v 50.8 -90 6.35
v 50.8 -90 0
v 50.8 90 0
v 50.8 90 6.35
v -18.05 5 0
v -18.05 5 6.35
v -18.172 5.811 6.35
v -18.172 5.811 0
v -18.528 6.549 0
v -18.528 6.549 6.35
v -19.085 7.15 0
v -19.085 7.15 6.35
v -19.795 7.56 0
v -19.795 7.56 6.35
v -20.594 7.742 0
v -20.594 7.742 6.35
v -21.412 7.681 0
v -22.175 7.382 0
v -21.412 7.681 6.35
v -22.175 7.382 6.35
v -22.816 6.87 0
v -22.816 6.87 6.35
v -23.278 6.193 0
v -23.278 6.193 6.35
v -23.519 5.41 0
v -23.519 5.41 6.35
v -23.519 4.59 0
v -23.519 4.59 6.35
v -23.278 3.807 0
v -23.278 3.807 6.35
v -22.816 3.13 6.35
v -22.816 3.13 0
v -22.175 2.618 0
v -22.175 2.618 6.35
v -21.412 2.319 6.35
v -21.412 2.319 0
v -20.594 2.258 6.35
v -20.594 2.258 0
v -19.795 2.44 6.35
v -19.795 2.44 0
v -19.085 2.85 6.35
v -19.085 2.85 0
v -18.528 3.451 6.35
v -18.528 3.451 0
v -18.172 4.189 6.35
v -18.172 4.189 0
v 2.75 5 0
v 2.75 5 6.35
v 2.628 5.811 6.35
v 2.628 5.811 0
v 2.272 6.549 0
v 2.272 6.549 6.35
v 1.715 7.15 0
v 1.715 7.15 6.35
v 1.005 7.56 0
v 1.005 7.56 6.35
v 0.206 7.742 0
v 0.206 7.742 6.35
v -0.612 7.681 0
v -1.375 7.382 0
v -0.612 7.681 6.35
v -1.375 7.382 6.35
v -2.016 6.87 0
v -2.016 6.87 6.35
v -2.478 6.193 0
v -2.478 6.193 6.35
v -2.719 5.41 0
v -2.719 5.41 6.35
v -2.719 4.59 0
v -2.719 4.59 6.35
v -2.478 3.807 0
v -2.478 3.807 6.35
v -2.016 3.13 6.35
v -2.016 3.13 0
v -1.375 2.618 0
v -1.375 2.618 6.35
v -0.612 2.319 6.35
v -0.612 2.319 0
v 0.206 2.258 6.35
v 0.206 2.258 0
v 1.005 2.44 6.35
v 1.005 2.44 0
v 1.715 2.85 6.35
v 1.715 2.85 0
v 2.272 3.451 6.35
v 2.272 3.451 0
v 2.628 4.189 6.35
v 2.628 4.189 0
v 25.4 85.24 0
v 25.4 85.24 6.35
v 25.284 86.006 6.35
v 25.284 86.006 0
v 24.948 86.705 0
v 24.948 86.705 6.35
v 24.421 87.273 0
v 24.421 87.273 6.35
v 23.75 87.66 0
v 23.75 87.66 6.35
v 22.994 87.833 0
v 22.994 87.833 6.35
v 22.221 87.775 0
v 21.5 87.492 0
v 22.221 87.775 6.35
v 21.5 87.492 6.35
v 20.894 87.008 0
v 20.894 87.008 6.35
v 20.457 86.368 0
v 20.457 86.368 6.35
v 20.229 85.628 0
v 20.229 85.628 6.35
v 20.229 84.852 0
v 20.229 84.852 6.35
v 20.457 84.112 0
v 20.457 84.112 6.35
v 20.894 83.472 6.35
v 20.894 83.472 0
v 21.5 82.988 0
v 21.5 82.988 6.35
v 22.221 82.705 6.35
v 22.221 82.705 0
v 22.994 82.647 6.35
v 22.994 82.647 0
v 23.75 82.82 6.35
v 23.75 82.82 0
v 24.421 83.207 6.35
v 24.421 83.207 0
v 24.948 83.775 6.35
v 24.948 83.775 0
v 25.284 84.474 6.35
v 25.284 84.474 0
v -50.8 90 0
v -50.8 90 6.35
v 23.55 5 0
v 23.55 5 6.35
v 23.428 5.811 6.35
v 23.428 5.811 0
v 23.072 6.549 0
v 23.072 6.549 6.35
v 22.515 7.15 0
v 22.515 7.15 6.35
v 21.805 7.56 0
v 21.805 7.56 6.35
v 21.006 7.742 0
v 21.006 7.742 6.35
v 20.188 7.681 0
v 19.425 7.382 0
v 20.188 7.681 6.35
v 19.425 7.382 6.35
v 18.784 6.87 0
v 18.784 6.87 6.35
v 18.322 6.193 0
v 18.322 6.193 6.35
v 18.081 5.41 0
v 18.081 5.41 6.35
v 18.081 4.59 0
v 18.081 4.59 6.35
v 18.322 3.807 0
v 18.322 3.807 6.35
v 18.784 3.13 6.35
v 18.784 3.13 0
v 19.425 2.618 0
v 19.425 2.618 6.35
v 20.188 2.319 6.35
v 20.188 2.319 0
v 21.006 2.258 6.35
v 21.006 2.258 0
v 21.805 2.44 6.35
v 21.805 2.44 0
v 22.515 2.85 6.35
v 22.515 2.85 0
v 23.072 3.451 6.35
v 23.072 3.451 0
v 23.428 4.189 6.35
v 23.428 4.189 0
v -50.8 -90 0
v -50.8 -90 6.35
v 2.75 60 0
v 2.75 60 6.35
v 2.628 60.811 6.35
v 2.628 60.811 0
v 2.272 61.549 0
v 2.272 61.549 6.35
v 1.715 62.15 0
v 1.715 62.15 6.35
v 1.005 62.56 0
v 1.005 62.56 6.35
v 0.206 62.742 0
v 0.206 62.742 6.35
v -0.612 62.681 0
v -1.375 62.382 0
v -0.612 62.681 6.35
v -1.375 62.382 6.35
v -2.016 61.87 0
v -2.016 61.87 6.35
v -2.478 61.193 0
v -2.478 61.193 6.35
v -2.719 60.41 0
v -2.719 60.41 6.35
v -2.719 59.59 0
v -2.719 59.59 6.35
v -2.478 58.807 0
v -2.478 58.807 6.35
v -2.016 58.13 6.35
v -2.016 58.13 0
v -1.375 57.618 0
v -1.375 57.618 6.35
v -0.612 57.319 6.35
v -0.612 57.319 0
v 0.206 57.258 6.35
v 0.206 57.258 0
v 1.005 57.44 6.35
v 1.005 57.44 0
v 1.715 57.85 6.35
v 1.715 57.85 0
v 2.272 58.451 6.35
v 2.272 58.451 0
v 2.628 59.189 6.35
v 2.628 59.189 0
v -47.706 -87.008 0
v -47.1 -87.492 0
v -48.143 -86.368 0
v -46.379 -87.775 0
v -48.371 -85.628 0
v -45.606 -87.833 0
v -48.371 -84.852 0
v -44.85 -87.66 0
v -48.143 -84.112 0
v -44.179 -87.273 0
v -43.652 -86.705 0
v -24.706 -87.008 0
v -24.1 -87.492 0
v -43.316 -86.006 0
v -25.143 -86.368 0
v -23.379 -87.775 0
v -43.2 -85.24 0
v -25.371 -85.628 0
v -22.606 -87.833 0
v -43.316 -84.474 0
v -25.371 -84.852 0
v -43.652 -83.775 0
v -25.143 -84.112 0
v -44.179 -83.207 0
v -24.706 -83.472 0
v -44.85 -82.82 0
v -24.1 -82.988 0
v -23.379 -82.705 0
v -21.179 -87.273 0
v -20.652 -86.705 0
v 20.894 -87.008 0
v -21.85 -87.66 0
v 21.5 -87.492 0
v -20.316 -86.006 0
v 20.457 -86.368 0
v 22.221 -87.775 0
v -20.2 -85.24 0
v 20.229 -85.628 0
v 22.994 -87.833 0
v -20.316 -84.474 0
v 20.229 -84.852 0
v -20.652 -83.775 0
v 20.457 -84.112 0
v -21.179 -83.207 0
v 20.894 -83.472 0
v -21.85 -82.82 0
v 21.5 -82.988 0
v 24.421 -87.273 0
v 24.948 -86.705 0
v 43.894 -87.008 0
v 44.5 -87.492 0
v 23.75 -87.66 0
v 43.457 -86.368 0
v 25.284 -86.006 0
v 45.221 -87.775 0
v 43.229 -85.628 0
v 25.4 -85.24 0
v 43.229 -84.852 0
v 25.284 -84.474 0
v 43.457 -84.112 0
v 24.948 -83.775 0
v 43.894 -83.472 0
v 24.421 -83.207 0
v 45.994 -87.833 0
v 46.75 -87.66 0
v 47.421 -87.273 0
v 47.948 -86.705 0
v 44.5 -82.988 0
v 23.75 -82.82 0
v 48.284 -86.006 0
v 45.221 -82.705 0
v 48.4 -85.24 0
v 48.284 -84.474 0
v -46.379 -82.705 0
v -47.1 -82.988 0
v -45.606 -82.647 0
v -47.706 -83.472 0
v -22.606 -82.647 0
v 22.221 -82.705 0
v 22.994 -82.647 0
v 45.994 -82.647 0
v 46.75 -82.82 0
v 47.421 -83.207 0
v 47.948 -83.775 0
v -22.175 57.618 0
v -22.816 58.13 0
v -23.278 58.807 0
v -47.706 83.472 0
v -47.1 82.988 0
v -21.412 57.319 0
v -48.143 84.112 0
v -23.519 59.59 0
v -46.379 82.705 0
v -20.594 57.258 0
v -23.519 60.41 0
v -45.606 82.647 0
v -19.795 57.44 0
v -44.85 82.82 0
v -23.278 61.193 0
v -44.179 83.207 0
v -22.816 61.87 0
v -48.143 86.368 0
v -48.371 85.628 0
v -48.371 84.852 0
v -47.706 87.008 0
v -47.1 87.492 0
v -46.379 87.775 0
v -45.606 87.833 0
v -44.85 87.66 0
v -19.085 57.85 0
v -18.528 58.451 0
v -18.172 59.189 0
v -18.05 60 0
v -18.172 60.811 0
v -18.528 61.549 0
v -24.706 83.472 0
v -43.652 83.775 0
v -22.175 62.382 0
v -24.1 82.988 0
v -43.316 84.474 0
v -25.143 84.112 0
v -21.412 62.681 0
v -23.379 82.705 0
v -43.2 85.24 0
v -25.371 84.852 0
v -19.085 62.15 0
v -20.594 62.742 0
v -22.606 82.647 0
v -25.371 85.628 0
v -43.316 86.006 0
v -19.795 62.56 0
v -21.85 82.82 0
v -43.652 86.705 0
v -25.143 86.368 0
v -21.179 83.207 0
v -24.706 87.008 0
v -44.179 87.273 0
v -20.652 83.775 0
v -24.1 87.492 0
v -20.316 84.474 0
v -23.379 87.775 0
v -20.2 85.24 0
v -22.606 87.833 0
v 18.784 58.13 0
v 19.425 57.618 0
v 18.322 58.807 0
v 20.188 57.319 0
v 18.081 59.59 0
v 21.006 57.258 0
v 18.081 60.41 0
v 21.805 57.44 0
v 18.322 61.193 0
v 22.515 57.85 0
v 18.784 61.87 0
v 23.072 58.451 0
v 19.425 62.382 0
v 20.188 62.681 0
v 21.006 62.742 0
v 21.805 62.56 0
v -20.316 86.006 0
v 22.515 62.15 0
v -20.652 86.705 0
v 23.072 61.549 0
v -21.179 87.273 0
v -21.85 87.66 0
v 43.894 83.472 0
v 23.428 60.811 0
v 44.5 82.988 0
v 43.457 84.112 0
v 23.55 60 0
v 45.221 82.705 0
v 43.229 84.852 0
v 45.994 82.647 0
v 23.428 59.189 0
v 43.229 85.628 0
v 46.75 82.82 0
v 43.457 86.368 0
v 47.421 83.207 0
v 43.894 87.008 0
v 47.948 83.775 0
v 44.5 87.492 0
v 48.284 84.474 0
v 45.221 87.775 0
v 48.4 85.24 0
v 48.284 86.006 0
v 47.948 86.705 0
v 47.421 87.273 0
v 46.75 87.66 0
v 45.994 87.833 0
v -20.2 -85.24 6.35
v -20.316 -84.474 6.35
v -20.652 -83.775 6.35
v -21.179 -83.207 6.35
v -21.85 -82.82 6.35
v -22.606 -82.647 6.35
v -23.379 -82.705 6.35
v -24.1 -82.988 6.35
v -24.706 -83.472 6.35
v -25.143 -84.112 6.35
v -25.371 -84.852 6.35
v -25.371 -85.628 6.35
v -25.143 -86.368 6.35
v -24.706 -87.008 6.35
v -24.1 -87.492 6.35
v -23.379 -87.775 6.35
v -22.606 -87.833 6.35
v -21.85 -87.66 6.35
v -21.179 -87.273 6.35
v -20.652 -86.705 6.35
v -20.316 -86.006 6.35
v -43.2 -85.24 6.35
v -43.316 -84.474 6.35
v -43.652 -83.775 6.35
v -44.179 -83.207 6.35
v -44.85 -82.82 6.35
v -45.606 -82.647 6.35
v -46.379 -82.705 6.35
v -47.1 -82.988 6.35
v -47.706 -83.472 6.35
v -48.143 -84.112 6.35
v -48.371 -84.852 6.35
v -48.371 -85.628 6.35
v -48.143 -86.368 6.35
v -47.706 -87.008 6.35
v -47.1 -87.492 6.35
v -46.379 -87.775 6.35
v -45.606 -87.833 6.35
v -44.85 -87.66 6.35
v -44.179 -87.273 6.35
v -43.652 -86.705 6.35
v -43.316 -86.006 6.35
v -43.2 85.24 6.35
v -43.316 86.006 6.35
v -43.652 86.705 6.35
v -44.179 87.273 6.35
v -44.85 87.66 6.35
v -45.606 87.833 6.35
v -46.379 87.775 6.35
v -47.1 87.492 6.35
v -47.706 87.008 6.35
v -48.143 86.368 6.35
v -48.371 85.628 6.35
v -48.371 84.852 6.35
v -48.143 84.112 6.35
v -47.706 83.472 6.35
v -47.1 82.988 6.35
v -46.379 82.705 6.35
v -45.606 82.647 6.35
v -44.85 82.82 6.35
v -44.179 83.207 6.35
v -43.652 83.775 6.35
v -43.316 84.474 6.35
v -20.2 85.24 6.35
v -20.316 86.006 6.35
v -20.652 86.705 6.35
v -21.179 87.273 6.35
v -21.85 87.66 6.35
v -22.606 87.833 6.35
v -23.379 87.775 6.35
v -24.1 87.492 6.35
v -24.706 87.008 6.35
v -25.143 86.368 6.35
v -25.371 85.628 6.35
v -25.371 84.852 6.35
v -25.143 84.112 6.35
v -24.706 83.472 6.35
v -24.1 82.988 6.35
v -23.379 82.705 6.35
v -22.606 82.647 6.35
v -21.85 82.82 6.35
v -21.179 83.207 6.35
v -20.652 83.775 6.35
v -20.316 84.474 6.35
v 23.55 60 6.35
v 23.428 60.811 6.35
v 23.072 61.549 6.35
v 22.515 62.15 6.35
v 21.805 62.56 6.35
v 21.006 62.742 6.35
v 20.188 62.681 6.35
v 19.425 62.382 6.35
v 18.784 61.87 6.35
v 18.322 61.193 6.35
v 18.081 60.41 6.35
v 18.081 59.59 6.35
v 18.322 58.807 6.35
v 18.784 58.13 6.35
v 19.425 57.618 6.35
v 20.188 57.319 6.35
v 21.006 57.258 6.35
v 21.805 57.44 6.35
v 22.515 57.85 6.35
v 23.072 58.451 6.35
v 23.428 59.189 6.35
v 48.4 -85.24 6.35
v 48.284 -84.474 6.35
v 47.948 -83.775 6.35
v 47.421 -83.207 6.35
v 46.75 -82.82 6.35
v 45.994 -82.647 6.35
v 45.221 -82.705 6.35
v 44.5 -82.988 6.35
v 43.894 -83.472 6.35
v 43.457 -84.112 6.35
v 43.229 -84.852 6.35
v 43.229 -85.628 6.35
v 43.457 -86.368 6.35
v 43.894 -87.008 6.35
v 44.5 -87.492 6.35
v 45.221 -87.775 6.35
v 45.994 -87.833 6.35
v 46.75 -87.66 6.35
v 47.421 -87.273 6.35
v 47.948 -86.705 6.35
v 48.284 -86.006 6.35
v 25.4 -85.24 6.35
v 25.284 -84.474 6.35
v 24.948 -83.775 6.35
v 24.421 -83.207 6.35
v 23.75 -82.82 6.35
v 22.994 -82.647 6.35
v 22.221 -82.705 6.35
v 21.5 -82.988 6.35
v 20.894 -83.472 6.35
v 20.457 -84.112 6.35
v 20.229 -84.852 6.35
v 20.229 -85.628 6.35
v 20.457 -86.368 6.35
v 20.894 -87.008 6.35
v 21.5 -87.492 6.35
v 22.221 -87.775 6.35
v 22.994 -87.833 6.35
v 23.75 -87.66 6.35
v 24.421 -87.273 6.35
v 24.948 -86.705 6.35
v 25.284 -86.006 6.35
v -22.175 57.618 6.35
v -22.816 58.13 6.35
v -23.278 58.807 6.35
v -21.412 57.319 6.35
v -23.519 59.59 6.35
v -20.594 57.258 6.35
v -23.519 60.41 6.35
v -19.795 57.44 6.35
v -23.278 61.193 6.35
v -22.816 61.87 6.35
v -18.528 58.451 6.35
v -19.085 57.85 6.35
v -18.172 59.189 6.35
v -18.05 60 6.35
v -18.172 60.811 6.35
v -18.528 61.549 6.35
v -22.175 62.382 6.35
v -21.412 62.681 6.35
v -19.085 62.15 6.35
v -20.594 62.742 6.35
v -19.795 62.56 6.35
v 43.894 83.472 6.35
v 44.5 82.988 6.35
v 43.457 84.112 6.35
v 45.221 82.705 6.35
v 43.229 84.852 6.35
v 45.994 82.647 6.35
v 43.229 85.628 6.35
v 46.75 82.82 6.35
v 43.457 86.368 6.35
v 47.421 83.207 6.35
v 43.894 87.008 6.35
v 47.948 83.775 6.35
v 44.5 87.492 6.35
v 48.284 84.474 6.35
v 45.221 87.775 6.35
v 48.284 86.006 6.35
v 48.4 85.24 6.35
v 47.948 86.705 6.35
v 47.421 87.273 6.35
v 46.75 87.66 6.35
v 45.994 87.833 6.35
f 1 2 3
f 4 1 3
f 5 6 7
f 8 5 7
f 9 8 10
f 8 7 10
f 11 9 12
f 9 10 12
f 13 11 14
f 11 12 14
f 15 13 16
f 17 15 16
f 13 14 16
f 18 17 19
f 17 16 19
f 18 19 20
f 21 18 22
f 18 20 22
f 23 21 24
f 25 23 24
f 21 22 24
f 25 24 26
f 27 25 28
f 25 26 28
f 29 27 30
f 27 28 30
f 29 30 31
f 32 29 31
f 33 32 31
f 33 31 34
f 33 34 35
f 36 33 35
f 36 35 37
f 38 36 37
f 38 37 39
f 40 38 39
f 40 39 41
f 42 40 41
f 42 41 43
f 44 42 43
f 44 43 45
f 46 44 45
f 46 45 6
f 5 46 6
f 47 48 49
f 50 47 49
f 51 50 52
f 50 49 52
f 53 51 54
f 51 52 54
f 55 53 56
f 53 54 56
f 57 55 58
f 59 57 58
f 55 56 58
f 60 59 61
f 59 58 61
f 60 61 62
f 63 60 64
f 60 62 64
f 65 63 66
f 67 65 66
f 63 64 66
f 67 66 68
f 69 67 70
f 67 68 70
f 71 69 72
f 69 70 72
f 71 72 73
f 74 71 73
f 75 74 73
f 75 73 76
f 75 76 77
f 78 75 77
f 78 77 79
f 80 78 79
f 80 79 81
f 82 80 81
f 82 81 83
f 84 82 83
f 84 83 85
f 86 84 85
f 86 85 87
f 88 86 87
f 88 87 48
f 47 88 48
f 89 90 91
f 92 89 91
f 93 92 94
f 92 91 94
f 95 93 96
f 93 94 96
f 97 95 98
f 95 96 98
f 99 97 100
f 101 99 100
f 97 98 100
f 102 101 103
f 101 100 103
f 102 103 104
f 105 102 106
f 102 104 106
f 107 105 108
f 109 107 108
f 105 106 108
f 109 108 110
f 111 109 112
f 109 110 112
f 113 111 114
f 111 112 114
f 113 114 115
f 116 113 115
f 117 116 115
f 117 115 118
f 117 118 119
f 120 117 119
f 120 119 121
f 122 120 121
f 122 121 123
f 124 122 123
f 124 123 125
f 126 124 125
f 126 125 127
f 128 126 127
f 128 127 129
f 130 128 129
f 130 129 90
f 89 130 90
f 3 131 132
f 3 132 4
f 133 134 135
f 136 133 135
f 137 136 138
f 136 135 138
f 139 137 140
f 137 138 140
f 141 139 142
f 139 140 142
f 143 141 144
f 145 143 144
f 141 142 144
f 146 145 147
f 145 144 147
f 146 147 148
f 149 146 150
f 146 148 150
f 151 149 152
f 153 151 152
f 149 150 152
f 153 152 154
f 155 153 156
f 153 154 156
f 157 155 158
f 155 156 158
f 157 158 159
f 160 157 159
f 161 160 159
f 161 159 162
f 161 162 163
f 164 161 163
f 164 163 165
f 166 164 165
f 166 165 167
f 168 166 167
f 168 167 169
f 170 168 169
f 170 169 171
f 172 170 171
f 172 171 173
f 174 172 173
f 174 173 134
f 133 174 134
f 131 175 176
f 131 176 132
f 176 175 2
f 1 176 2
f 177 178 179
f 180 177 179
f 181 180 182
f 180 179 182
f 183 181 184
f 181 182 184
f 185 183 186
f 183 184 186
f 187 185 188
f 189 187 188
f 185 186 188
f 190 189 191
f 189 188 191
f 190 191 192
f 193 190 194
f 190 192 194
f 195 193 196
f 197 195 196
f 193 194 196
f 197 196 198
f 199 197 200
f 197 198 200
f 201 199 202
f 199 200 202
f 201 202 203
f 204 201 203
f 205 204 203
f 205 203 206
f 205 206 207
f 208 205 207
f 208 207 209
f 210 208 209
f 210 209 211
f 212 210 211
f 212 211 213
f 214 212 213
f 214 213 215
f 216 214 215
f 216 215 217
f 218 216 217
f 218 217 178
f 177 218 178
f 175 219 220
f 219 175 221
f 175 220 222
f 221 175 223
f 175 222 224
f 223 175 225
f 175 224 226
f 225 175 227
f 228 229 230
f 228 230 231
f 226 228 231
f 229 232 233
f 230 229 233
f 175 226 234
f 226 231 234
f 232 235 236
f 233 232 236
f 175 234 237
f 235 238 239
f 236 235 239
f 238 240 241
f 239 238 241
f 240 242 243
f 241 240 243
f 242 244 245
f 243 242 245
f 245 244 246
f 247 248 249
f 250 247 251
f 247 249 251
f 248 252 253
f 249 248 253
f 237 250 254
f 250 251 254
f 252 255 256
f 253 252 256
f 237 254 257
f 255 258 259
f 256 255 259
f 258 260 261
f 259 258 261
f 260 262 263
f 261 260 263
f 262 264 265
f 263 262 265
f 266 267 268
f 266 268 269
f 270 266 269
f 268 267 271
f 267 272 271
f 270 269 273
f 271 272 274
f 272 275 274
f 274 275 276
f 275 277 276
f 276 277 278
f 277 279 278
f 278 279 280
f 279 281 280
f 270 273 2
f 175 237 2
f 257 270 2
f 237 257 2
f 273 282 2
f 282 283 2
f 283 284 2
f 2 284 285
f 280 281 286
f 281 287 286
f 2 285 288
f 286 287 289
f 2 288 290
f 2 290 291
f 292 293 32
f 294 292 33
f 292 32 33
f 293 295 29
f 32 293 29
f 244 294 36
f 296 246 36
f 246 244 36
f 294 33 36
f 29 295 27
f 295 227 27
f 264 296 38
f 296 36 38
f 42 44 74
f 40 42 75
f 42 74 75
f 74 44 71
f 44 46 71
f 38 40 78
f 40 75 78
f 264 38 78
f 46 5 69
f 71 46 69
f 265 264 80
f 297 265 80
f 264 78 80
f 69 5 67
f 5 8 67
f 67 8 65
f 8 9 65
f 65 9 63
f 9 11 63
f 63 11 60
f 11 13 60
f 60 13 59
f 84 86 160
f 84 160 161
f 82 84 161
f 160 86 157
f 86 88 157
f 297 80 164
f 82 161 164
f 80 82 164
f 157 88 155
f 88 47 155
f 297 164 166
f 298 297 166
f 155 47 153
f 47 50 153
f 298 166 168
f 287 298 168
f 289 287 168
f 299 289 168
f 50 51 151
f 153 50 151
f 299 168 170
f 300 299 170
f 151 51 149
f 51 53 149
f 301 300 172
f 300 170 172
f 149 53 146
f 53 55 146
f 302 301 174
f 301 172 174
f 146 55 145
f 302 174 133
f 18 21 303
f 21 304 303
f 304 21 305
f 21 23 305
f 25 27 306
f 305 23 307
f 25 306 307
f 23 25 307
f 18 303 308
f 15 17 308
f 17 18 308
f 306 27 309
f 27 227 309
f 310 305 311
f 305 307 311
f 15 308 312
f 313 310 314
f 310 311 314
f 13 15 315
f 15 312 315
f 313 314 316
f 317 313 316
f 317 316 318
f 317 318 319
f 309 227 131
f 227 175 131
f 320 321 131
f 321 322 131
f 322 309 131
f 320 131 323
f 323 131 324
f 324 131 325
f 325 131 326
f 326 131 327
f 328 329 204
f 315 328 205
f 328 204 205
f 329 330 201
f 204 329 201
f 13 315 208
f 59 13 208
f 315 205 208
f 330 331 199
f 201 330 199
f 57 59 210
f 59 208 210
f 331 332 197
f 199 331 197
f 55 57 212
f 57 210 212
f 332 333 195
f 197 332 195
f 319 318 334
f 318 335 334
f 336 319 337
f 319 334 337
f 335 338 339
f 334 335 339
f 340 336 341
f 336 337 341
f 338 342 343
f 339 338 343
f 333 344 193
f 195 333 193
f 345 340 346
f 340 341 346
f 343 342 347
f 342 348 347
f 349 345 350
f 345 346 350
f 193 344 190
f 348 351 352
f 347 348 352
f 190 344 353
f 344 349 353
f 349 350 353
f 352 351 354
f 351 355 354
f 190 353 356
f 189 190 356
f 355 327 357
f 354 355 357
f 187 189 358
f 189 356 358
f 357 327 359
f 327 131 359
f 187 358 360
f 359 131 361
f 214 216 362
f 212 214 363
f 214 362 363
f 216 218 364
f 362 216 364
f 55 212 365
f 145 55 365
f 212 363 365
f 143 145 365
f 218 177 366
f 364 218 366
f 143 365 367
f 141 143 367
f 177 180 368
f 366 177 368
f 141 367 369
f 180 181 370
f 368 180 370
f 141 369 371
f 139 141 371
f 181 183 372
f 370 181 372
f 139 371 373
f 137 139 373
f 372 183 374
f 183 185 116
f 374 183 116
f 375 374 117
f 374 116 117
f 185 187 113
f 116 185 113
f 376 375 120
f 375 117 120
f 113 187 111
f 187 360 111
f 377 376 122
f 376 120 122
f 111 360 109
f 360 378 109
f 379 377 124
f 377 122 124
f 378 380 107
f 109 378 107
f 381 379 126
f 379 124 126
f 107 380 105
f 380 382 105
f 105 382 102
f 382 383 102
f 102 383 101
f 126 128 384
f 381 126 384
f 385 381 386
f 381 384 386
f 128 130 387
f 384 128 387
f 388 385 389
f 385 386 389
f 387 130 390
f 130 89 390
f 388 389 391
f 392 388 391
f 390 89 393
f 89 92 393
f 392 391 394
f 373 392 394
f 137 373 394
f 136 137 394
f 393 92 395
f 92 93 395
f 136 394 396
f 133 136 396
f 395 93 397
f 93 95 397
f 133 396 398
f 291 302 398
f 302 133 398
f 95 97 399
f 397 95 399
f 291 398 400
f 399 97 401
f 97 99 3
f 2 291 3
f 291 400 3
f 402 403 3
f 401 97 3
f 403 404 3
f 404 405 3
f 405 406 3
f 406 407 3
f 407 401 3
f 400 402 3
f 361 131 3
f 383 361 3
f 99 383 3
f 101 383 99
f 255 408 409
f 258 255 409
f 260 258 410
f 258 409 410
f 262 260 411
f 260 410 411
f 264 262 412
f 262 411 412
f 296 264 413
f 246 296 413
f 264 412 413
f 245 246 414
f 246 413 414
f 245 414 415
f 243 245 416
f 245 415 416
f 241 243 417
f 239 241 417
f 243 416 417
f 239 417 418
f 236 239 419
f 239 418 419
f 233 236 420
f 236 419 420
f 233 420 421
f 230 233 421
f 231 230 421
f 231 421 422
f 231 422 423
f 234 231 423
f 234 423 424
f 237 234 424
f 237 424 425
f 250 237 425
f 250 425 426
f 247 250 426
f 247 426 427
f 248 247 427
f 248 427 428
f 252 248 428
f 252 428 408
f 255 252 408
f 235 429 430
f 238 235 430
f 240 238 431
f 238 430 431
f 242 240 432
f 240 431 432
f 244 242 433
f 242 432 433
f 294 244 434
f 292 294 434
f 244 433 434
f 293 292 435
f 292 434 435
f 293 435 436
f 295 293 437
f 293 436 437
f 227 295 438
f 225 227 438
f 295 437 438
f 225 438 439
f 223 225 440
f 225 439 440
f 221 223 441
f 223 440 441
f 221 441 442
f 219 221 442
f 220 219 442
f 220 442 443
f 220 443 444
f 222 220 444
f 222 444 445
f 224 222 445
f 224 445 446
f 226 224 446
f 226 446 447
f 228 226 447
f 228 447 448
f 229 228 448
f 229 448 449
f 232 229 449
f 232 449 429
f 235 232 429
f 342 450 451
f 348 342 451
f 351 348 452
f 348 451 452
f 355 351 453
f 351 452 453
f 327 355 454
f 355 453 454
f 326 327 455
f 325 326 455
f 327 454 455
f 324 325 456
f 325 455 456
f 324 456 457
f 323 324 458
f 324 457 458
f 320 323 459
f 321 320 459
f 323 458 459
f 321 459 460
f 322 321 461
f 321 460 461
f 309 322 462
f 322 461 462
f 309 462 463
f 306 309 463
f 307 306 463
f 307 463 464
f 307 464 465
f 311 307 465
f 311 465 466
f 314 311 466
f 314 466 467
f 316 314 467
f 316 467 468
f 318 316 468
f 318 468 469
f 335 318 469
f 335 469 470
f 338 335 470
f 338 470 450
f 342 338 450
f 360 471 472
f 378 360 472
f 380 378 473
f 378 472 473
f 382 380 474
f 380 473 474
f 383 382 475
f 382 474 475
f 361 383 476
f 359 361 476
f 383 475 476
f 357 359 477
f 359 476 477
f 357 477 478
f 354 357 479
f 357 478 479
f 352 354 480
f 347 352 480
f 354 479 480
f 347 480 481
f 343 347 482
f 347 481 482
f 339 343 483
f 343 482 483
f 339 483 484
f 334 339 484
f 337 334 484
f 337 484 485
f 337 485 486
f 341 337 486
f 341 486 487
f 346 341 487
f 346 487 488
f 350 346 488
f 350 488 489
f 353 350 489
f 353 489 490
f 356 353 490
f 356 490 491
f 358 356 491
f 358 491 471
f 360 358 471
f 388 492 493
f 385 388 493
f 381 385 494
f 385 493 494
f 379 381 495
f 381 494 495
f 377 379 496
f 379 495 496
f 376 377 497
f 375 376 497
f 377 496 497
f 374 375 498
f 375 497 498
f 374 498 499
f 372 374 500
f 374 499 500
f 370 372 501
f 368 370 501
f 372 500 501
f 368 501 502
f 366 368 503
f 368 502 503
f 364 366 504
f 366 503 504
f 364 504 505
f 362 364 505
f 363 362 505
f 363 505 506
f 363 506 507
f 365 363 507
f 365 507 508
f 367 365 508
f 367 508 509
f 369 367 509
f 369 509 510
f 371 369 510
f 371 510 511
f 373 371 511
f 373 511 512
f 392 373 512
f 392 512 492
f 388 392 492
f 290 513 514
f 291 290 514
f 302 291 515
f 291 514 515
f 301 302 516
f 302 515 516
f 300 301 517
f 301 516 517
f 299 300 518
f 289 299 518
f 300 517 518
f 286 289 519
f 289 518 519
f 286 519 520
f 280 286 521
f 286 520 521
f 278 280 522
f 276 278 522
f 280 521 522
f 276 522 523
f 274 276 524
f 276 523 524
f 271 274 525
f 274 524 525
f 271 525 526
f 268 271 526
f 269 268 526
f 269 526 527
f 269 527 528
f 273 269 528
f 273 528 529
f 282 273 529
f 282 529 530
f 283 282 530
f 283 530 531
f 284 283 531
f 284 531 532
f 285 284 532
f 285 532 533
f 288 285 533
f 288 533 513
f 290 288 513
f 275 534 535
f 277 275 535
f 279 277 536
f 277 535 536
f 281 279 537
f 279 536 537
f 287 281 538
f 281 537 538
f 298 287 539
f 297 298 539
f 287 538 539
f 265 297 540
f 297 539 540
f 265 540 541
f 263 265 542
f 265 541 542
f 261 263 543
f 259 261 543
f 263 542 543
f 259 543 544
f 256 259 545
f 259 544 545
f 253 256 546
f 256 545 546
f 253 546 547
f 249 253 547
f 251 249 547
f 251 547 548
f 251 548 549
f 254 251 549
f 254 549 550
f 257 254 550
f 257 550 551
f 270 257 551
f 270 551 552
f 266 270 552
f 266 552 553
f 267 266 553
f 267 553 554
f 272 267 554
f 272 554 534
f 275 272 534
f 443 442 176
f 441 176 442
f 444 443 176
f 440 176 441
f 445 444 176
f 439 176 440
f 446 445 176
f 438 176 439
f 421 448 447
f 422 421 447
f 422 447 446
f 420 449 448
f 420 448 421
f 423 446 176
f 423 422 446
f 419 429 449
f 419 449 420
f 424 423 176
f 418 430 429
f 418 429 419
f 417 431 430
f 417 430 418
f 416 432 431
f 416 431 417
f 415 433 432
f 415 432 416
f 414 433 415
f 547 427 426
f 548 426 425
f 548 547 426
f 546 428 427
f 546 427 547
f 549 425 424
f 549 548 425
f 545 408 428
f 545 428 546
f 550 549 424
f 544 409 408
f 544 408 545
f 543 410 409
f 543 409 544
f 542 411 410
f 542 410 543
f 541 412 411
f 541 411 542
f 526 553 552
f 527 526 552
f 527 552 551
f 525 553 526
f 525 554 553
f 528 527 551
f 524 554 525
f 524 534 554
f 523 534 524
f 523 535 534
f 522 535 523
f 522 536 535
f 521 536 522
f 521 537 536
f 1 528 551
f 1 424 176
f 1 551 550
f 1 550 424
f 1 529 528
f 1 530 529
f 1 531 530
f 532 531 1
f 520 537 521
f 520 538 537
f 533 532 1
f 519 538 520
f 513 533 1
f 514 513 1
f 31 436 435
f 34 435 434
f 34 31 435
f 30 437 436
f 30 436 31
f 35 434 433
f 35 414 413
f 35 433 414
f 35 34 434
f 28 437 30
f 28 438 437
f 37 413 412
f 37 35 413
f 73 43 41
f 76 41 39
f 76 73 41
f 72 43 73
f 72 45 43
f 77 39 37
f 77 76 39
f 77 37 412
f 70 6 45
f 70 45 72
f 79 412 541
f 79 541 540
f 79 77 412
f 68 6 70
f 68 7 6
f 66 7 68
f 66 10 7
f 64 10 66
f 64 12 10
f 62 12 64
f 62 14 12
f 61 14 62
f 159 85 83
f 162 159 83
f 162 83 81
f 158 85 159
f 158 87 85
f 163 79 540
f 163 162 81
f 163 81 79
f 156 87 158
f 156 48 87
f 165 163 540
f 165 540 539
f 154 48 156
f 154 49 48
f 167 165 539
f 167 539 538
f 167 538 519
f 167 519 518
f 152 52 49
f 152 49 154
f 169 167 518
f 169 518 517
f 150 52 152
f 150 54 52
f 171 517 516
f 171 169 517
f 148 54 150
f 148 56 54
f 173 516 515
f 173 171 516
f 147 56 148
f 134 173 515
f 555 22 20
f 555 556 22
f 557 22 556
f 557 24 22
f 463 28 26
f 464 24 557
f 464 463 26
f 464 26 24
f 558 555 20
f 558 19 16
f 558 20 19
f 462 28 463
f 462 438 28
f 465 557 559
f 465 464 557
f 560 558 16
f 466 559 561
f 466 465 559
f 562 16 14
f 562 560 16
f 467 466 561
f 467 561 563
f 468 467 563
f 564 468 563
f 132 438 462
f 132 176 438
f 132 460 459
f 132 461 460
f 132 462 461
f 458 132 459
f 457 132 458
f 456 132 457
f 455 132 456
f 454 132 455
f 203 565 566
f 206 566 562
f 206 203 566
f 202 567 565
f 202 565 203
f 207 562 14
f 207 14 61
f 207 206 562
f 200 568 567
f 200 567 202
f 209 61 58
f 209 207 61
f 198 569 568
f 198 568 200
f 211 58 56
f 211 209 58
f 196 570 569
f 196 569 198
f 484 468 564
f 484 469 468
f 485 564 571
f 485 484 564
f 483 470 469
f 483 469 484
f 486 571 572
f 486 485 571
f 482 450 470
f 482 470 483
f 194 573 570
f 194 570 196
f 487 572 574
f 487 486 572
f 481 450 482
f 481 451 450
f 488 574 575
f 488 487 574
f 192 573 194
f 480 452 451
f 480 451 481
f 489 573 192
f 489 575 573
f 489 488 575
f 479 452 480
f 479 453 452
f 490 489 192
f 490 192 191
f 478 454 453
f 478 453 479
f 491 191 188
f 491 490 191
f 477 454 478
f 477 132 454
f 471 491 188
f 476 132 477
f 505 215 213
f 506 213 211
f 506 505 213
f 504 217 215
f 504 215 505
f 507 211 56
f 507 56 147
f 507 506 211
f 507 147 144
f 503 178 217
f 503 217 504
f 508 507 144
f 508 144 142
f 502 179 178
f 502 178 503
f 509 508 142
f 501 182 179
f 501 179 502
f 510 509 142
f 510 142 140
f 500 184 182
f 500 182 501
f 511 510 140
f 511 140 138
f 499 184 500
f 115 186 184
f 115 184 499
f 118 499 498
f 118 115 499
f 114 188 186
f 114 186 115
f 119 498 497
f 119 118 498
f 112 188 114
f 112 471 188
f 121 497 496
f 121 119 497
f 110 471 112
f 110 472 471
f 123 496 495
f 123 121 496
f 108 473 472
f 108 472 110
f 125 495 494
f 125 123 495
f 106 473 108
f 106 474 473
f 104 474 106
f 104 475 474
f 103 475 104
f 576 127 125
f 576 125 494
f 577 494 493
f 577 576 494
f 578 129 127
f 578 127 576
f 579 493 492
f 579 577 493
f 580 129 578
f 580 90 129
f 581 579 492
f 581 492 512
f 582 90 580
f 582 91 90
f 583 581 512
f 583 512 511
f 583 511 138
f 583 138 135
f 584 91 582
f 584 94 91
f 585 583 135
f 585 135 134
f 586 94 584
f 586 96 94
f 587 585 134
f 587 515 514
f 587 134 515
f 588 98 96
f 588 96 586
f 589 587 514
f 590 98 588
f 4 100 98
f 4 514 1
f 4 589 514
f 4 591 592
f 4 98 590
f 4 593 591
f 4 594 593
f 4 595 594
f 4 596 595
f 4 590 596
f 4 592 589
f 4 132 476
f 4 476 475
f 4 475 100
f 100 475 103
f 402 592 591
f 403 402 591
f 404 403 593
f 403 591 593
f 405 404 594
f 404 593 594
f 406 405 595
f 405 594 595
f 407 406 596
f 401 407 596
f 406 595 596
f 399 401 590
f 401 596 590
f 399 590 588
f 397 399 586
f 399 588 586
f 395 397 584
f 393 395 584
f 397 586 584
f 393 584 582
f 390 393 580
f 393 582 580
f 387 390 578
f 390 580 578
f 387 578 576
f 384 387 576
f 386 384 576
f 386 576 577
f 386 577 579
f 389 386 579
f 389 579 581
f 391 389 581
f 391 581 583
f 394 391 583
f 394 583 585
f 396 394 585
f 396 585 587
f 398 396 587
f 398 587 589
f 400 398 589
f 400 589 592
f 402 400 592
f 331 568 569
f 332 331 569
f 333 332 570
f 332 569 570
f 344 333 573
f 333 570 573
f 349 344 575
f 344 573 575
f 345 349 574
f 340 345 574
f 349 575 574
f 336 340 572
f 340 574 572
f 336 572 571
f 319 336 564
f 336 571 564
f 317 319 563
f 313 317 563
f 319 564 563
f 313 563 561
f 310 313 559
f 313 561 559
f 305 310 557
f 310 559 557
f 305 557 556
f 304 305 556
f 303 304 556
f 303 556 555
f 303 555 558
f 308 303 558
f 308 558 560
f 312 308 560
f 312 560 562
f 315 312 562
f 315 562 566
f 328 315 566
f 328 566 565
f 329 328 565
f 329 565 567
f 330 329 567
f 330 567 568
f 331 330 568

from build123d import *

# Parameters (mm, degrees)
ESBO_O1_W                = 101.6
ESBO_O1_H                = 180
RESSALTO_EXTRUS_O1_DEPTH = 6.35
CORTE_EXTRUS_O1_REACH    = 105.542
ESBO_O2_R                = 2.6
CORTE_EXTRUS_O2_REACH    = 105.542
ESBO_O3_R                = 2.75


with BuildPart() as part:
    # Esboço1 → Ressalto-extrusão1 (new body)
    with BuildSketch(Plane.XY):
        Rectangle(ESBO_O1_W, ESBO_O1_H)
    extrude(amount=RESSALTO_EXTRUS_O1_DEPTH)

    # Esboço2 → Corte-extrusão1 (cut, up to next)
    with BuildSketch(Plane.XY.offset(6.35), mode=Mode.PRIVATE) as corte_extrus_o1_sk1:
        with Locations((-45.8, 85.24)):
            Circle(ESBO_O2_R)
    corte_extrus_o1_tool1 = extrude(corte_extrus_o1_sk1.sketch, amount=-CORTE_EXTRUS_O1_REACH, mode=Mode.PRIVATE) & part.part
    # Esboço2 → Corte-extrusão1 (cut, up to next)
    with BuildSketch(Plane.XY.offset(6.35), mode=Mode.PRIVATE) as corte_extrus_o1_sk2:
        with Locations((-22.8, 85.24)):
            Circle(ESBO_O2_R)
    corte_extrus_o1_tool2 = extrude(corte_extrus_o1_sk2.sketch, amount=-CORTE_EXTRUS_O1_REACH, mode=Mode.PRIVATE) & part.part
    # Esboço2 → Corte-extrusão1 (cut, up to next)
    with BuildSketch(Plane.XY.offset(6.35), mode=Mode.PRIVATE) as corte_extrus_o1_sk3:
        with Locations((22.8, 85.24)):
            Circle(ESBO_O2_R)
    corte_extrus_o1_tool3 = extrude(corte_extrus_o1_sk3.sketch, amount=-CORTE_EXTRUS_O1_REACH, mode=Mode.PRIVATE) & part.part
    # Esboço2 → Corte-extrusão1 (cut, up to next)
    with BuildSketch(Plane.XY.offset(6.35), mode=Mode.PRIVATE) as corte_extrus_o1_sk4:
        with Locations((45.8, 85.24)):
            Circle(ESBO_O2_R)
    corte_extrus_o1_tool4 = extrude(corte_extrus_o1_sk4.sketch, amount=-CORTE_EXTRUS_O1_REACH, mode=Mode.PRIVATE) & part.part
    # Esboço2 → Corte-extrusão1 (cut, up to next)
    with BuildSketch(Plane.XY.offset(6.35), mode=Mode.PRIVATE) as corte_extrus_o1_sk5:
        with Locations((45.8, -85.24)):
            Circle(ESBO_O2_R)
    corte_extrus_o1_tool5 = extrude(corte_extrus_o1_sk5.sketch, amount=-CORTE_EXTRUS_O1_REACH, mode=Mode.PRIVATE) & part.part
    # Esboço2 → Corte-extrusão1 (cut, up to next)
    with BuildSketch(Plane.XY.offset(6.35), mode=Mode.PRIVATE) as corte_extrus_o1_sk6:
        with Locations((22.8, -85.24)):
            Circle(ESBO_O2_R)
    corte_extrus_o1_tool6 = extrude(corte_extrus_o1_sk6.sketch, amount=-CORTE_EXTRUS_O1_REACH, mode=Mode.PRIVATE) & part.part
    # Esboço2 → Corte-extrusão1 (cut, up to next)
    with BuildSketch(Plane.XY.offset(6.35), mode=Mode.PRIVATE) as corte_extrus_o1_sk7:
        with Locations((-22.8, -85.24)):
            Circle(ESBO_O2_R)
    corte_extrus_o1_tool7 = extrude(corte_extrus_o1_sk7.sketch, amount=-CORTE_EXTRUS_O1_REACH, mode=Mode.PRIVATE) & part.part
    # Esboço2 → Corte-extrusão1 (cut, up to next)
    with BuildSketch(Plane.XY.offset(6.35), mode=Mode.PRIVATE) as corte_extrus_o1_sk8:
        with Locations((-45.8, -85.24)):
            Circle(ESBO_O2_R)
    corte_extrus_o1_tool8 = extrude(corte_extrus_o1_sk8.sketch, amount=-CORTE_EXTRUS_O1_REACH, mode=Mode.PRIVATE) & part.part
    add(corte_extrus_o1_tool1.solids().sort_by_distance((-45.8, 85.24, 6.35))[0], mode=Mode.SUBTRACT)
    add(corte_extrus_o1_tool2.solids().sort_by_distance((-22.8, 85.24, 6.35))[0], mode=Mode.SUBTRACT)
    add(corte_extrus_o1_tool3.solids().sort_by_distance((22.8, 85.24, 6.35))[0], mode=Mode.SUBTRACT)
    add(corte_extrus_o1_tool4.solids().sort_by_distance((45.8, 85.24, 6.35))[0], mode=Mode.SUBTRACT)
    add(corte_extrus_o1_tool5.solids().sort_by_distance((45.8, -85.24, 6.35))[0], mode=Mode.SUBTRACT)
    add(corte_extrus_o1_tool6.solids().sort_by_distance((22.8, -85.24, 6.35))[0], mode=Mode.SUBTRACT)
    add(corte_extrus_o1_tool7.solids().sort_by_distance((-22.8, -85.24, 6.35))[0], mode=Mode.SUBTRACT)
    add(corte_extrus_o1_tool8.solids().sort_by_distance((-45.8, -85.24, 6.35))[0], mode=Mode.SUBTRACT)

    # Esboço3 → Corte-extrusão2 (cut, up to next)
    with BuildSketch(Plane.XY.offset(6.35), mode=Mode.PRIVATE) as corte_extrus_o2_sk1:
        with Locations((-20.8, 5)):
            Circle(ESBO_O3_R)
    corte_extrus_o2_tool1 = extrude(corte_extrus_o2_sk1.sketch, amount=-CORTE_EXTRUS_O2_REACH, mode=Mode.PRIVATE) & part.part
    # Esboço3 → Corte-extrusão2 (cut, up to next)
    with BuildSketch(Plane.XY.offset(6.35), mode=Mode.PRIVATE) as corte_extrus_o2_sk2:
        with Locations((0, 5)):
            Circle(ESBO_O3_R)
    corte_extrus_o2_tool2 = extrude(corte_extrus_o2_sk2.sketch, amount=-CORTE_EXTRUS_O2_REACH, mode=Mode.PRIVATE) & part.part
    # Esboço3 → Corte-extrusão2 (cut, up to next)
    with BuildSketch(Plane.XY.offset(6.35), mode=Mode.PRIVATE) as corte_extrus_o2_sk3:
        with Locations((20.8, 5)):
            Circle(ESBO_O3_R)
    corte_extrus_o2_tool3 = extrude(corte_extrus_o2_sk3.sketch, amount=-CORTE_EXTRUS_O2_REACH, mode=Mode.PRIVATE) & part.part
    # Esboço3 → Corte-extrusão2 (cut, up to next)
    with BuildSketch(Plane.XY.offset(6.35), mode=Mode.PRIVATE) as corte_extrus_o2_sk4:
        with Locations((20.8, 60)):
            Circle(ESBO_O3_R)
    corte_extrus_o2_tool4 = extrude(corte_extrus_o2_sk4.sketch, amount=-CORTE_EXTRUS_O2_REACH, mode=Mode.PRIVATE) & part.part
    # Esboço3 → Corte-extrusão2 (cut, up to next)
    with BuildSketch(Plane.XY.offset(6.35), mode=Mode.PRIVATE) as corte_extrus_o2_sk5:
        with Locations((0, 60)):
            Circle(ESBO_O3_R)
    corte_extrus_o2_tool5 = extrude(corte_extrus_o2_sk5.sketch, amount=-CORTE_EXTRUS_O2_REACH, mode=Mode.PRIVATE) & part.part
    # Esboço3 → Corte-extrusão2 (cut, up to next)
    with BuildSketch(Plane.XY.offset(6.35), mode=Mode.PRIVATE) as corte_extrus_o2_sk6:
        with Locations((-20.8, 60)):
            Circle(ESBO_O3_R)
    corte_extrus_o2_tool6 = extrude(corte_extrus_o2_sk6.sketch, amount=-CORTE_EXTRUS_O2_REACH, mode=Mode.PRIVATE) & part.part
    add(corte_extrus_o2_tool1.solids().sort_by_distance((-20.8, 5, 6.35))[0], mode=Mode.SUBTRACT)
    add(corte_extrus_o2_tool2.solids().sort_by_distance((0, 5, 6.35))[0], mode=Mode.SUBTRACT)
    add(corte_extrus_o2_tool3.solids().sort_by_distance((20.8, 5, 6.35))[0], mode=Mode.SUBTRACT)
    add(corte_extrus_o2_tool4.solids().sort_by_distance((20.8, 60, 6.35))[0], mode=Mode.SUBTRACT)
    add(corte_extrus_o2_tool5.solids().sort_by_distance((0, 60, 6.35))[0], mode=Mode.SUBTRACT)
    add(corte_extrus_o2_tool6.solids().sort_by_distance((-20.8, 60, 6.35))[0], mode=Mode.SUBTRACT)


solid = part.part
